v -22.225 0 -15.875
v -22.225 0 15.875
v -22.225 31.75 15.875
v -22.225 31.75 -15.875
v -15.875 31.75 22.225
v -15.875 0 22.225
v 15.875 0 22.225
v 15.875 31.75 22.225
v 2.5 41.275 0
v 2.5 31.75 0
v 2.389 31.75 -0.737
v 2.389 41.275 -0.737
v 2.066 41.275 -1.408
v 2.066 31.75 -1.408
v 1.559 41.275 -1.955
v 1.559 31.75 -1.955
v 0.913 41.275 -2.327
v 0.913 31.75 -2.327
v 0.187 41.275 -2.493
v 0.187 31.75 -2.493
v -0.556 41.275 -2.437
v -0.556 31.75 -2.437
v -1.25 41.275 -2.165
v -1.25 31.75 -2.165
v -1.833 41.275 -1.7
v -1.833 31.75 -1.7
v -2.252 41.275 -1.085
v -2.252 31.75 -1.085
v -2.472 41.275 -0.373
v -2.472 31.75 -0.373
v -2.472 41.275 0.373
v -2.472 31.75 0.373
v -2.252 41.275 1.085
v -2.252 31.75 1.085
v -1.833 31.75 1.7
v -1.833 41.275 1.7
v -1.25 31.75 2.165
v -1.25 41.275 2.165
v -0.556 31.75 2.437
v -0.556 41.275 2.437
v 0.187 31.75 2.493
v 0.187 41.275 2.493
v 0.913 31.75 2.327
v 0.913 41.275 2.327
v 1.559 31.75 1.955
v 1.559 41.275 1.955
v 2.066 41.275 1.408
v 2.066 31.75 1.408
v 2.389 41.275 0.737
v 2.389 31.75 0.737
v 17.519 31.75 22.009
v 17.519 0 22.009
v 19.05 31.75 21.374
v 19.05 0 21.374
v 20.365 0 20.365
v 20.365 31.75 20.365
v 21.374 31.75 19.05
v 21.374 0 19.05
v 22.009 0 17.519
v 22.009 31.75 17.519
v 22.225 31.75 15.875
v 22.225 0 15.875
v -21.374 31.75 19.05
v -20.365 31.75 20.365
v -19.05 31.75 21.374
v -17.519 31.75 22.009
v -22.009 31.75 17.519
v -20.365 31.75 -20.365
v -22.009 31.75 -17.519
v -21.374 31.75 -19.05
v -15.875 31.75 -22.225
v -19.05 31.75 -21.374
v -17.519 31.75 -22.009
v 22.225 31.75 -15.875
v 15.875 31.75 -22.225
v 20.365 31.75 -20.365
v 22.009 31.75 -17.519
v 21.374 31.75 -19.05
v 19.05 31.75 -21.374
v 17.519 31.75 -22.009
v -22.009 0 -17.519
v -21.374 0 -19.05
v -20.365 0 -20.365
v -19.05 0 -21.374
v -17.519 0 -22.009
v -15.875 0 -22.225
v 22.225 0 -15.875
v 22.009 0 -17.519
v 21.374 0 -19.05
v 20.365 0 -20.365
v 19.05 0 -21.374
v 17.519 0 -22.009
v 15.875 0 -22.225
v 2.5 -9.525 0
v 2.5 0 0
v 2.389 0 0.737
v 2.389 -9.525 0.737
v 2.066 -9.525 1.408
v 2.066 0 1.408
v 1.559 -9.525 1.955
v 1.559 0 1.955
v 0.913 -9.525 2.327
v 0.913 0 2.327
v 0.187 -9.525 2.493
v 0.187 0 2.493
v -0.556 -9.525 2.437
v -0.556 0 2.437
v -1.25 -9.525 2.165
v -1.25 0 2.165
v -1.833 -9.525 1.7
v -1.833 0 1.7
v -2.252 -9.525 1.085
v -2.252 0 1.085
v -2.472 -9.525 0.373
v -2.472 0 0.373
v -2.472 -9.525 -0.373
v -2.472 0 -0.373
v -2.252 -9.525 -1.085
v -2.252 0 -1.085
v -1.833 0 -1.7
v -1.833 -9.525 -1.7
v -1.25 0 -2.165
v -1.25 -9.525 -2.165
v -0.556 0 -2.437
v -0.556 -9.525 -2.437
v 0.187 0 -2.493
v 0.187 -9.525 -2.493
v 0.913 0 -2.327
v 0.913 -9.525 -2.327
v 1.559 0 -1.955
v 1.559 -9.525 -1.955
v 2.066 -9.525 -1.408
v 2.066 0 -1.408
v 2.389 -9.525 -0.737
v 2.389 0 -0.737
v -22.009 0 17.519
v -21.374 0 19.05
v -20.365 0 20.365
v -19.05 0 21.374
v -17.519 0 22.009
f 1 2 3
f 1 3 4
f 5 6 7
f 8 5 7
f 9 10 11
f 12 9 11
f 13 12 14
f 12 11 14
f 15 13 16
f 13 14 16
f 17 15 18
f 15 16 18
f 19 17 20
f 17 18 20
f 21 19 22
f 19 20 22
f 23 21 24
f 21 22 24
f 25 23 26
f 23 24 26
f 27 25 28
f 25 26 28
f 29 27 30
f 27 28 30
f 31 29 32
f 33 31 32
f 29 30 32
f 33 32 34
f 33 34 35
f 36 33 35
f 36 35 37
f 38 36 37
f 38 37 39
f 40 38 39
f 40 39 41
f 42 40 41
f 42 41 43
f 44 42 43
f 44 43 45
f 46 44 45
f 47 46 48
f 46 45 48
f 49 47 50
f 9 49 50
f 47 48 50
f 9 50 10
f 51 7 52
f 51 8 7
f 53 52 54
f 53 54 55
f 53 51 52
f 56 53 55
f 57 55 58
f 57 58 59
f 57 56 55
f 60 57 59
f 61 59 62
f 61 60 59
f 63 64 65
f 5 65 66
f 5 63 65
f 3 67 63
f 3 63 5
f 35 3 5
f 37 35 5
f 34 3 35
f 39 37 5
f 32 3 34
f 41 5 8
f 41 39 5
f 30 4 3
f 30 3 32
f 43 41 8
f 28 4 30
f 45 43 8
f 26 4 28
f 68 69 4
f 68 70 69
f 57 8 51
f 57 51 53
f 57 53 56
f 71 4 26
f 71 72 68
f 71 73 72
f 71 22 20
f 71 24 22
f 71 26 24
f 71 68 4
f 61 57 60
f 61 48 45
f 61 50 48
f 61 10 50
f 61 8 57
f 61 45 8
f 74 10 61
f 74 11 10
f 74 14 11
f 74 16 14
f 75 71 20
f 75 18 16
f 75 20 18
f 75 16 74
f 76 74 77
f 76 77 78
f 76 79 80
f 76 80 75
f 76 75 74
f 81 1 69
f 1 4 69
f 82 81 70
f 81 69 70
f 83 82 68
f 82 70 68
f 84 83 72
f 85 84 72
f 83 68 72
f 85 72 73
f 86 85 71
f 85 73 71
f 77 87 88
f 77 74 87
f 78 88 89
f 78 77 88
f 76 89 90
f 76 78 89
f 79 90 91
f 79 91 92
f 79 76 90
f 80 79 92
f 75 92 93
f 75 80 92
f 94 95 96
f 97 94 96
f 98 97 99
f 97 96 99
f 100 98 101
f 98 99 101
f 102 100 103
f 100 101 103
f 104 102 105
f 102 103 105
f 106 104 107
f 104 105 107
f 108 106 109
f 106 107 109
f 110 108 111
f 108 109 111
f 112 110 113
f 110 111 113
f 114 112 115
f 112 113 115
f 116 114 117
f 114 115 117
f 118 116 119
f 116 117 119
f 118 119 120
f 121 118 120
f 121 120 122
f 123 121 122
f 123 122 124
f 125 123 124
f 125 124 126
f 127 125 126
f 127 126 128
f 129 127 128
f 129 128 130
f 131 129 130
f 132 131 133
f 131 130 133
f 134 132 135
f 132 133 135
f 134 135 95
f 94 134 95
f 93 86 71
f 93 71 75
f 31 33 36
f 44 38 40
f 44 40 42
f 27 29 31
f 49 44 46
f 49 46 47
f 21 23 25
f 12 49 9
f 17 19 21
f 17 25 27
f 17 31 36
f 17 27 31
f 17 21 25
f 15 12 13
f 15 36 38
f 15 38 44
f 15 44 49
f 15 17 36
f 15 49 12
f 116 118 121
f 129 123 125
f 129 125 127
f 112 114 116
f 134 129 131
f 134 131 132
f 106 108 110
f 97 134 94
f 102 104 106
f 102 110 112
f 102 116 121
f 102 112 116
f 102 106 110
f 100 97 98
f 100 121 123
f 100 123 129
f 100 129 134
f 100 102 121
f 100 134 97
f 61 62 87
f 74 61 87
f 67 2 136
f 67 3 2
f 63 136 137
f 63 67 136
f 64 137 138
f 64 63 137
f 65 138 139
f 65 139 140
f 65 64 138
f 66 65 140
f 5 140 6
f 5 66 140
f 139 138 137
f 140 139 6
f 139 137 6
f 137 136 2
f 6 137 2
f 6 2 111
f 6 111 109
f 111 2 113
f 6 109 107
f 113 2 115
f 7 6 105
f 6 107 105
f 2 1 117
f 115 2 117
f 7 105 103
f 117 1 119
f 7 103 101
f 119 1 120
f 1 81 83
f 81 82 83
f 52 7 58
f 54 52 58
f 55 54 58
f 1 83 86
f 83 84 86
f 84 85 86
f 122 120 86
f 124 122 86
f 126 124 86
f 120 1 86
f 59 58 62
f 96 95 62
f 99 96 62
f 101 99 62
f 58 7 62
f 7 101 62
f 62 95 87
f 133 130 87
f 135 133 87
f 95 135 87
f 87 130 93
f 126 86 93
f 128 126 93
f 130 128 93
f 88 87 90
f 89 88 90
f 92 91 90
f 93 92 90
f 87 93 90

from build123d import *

# Parameters (mm, degrees)
SKETCH1_W           = 44.45
SKETCH1_H           = 44.45
BOSS_EXTRUDE1_DEPTH = 31.75
FILLET1_R           = 6.35
SKETCH2_R           = 2.5
BOSS_EXTRUDE2_DEPTH = 9.525
SKETCH4_R           = 2.5
BOSS_EXTRUDE3_DEPTH = 9.525


with BuildPart() as part:
    # Sketch1 → Boss-Extrude1 (new body)
    with BuildSketch(Plane(origin=(0, 0, 0), x_dir=(1, 0, 0), z_dir=(0, 1, 0))):
        Rectangle(SKETCH1_W, SKETCH1_H)
    extrude(amount=BOSS_EXTRUDE1_DEPTH)

    # Fillet1
    fillet1_edges = [part.edges().sort_by_distance(p)[0] for p in [
        (22.225, 15.875, 22.225),
        (-22.225, 15.875, 22.225),
        (-22.225, 15.875, -22.225),
        (22.225, 15.875, -22.225),
    ]]
    fillet(fillet1_edges, radius=FILLET1_R)

    # Sketch2 → Boss-Extrude2 (add)
    with BuildSketch(Plane(origin=(0, 31.75, 0), x_dir=(1, 0, 0), z_dir=(0, 1, 0))):
        Circle(SKETCH2_R)
    extrude(amount=BOSS_EXTRUDE2_DEPTH)

    # Sketch4 → Boss-Extrude3 (add)
    with BuildSketch(Plane.XZ):
        Circle(SKETCH4_R)
    extrude(amount=BOSS_EXTRUDE3_DEPTH)


solid = part.part
